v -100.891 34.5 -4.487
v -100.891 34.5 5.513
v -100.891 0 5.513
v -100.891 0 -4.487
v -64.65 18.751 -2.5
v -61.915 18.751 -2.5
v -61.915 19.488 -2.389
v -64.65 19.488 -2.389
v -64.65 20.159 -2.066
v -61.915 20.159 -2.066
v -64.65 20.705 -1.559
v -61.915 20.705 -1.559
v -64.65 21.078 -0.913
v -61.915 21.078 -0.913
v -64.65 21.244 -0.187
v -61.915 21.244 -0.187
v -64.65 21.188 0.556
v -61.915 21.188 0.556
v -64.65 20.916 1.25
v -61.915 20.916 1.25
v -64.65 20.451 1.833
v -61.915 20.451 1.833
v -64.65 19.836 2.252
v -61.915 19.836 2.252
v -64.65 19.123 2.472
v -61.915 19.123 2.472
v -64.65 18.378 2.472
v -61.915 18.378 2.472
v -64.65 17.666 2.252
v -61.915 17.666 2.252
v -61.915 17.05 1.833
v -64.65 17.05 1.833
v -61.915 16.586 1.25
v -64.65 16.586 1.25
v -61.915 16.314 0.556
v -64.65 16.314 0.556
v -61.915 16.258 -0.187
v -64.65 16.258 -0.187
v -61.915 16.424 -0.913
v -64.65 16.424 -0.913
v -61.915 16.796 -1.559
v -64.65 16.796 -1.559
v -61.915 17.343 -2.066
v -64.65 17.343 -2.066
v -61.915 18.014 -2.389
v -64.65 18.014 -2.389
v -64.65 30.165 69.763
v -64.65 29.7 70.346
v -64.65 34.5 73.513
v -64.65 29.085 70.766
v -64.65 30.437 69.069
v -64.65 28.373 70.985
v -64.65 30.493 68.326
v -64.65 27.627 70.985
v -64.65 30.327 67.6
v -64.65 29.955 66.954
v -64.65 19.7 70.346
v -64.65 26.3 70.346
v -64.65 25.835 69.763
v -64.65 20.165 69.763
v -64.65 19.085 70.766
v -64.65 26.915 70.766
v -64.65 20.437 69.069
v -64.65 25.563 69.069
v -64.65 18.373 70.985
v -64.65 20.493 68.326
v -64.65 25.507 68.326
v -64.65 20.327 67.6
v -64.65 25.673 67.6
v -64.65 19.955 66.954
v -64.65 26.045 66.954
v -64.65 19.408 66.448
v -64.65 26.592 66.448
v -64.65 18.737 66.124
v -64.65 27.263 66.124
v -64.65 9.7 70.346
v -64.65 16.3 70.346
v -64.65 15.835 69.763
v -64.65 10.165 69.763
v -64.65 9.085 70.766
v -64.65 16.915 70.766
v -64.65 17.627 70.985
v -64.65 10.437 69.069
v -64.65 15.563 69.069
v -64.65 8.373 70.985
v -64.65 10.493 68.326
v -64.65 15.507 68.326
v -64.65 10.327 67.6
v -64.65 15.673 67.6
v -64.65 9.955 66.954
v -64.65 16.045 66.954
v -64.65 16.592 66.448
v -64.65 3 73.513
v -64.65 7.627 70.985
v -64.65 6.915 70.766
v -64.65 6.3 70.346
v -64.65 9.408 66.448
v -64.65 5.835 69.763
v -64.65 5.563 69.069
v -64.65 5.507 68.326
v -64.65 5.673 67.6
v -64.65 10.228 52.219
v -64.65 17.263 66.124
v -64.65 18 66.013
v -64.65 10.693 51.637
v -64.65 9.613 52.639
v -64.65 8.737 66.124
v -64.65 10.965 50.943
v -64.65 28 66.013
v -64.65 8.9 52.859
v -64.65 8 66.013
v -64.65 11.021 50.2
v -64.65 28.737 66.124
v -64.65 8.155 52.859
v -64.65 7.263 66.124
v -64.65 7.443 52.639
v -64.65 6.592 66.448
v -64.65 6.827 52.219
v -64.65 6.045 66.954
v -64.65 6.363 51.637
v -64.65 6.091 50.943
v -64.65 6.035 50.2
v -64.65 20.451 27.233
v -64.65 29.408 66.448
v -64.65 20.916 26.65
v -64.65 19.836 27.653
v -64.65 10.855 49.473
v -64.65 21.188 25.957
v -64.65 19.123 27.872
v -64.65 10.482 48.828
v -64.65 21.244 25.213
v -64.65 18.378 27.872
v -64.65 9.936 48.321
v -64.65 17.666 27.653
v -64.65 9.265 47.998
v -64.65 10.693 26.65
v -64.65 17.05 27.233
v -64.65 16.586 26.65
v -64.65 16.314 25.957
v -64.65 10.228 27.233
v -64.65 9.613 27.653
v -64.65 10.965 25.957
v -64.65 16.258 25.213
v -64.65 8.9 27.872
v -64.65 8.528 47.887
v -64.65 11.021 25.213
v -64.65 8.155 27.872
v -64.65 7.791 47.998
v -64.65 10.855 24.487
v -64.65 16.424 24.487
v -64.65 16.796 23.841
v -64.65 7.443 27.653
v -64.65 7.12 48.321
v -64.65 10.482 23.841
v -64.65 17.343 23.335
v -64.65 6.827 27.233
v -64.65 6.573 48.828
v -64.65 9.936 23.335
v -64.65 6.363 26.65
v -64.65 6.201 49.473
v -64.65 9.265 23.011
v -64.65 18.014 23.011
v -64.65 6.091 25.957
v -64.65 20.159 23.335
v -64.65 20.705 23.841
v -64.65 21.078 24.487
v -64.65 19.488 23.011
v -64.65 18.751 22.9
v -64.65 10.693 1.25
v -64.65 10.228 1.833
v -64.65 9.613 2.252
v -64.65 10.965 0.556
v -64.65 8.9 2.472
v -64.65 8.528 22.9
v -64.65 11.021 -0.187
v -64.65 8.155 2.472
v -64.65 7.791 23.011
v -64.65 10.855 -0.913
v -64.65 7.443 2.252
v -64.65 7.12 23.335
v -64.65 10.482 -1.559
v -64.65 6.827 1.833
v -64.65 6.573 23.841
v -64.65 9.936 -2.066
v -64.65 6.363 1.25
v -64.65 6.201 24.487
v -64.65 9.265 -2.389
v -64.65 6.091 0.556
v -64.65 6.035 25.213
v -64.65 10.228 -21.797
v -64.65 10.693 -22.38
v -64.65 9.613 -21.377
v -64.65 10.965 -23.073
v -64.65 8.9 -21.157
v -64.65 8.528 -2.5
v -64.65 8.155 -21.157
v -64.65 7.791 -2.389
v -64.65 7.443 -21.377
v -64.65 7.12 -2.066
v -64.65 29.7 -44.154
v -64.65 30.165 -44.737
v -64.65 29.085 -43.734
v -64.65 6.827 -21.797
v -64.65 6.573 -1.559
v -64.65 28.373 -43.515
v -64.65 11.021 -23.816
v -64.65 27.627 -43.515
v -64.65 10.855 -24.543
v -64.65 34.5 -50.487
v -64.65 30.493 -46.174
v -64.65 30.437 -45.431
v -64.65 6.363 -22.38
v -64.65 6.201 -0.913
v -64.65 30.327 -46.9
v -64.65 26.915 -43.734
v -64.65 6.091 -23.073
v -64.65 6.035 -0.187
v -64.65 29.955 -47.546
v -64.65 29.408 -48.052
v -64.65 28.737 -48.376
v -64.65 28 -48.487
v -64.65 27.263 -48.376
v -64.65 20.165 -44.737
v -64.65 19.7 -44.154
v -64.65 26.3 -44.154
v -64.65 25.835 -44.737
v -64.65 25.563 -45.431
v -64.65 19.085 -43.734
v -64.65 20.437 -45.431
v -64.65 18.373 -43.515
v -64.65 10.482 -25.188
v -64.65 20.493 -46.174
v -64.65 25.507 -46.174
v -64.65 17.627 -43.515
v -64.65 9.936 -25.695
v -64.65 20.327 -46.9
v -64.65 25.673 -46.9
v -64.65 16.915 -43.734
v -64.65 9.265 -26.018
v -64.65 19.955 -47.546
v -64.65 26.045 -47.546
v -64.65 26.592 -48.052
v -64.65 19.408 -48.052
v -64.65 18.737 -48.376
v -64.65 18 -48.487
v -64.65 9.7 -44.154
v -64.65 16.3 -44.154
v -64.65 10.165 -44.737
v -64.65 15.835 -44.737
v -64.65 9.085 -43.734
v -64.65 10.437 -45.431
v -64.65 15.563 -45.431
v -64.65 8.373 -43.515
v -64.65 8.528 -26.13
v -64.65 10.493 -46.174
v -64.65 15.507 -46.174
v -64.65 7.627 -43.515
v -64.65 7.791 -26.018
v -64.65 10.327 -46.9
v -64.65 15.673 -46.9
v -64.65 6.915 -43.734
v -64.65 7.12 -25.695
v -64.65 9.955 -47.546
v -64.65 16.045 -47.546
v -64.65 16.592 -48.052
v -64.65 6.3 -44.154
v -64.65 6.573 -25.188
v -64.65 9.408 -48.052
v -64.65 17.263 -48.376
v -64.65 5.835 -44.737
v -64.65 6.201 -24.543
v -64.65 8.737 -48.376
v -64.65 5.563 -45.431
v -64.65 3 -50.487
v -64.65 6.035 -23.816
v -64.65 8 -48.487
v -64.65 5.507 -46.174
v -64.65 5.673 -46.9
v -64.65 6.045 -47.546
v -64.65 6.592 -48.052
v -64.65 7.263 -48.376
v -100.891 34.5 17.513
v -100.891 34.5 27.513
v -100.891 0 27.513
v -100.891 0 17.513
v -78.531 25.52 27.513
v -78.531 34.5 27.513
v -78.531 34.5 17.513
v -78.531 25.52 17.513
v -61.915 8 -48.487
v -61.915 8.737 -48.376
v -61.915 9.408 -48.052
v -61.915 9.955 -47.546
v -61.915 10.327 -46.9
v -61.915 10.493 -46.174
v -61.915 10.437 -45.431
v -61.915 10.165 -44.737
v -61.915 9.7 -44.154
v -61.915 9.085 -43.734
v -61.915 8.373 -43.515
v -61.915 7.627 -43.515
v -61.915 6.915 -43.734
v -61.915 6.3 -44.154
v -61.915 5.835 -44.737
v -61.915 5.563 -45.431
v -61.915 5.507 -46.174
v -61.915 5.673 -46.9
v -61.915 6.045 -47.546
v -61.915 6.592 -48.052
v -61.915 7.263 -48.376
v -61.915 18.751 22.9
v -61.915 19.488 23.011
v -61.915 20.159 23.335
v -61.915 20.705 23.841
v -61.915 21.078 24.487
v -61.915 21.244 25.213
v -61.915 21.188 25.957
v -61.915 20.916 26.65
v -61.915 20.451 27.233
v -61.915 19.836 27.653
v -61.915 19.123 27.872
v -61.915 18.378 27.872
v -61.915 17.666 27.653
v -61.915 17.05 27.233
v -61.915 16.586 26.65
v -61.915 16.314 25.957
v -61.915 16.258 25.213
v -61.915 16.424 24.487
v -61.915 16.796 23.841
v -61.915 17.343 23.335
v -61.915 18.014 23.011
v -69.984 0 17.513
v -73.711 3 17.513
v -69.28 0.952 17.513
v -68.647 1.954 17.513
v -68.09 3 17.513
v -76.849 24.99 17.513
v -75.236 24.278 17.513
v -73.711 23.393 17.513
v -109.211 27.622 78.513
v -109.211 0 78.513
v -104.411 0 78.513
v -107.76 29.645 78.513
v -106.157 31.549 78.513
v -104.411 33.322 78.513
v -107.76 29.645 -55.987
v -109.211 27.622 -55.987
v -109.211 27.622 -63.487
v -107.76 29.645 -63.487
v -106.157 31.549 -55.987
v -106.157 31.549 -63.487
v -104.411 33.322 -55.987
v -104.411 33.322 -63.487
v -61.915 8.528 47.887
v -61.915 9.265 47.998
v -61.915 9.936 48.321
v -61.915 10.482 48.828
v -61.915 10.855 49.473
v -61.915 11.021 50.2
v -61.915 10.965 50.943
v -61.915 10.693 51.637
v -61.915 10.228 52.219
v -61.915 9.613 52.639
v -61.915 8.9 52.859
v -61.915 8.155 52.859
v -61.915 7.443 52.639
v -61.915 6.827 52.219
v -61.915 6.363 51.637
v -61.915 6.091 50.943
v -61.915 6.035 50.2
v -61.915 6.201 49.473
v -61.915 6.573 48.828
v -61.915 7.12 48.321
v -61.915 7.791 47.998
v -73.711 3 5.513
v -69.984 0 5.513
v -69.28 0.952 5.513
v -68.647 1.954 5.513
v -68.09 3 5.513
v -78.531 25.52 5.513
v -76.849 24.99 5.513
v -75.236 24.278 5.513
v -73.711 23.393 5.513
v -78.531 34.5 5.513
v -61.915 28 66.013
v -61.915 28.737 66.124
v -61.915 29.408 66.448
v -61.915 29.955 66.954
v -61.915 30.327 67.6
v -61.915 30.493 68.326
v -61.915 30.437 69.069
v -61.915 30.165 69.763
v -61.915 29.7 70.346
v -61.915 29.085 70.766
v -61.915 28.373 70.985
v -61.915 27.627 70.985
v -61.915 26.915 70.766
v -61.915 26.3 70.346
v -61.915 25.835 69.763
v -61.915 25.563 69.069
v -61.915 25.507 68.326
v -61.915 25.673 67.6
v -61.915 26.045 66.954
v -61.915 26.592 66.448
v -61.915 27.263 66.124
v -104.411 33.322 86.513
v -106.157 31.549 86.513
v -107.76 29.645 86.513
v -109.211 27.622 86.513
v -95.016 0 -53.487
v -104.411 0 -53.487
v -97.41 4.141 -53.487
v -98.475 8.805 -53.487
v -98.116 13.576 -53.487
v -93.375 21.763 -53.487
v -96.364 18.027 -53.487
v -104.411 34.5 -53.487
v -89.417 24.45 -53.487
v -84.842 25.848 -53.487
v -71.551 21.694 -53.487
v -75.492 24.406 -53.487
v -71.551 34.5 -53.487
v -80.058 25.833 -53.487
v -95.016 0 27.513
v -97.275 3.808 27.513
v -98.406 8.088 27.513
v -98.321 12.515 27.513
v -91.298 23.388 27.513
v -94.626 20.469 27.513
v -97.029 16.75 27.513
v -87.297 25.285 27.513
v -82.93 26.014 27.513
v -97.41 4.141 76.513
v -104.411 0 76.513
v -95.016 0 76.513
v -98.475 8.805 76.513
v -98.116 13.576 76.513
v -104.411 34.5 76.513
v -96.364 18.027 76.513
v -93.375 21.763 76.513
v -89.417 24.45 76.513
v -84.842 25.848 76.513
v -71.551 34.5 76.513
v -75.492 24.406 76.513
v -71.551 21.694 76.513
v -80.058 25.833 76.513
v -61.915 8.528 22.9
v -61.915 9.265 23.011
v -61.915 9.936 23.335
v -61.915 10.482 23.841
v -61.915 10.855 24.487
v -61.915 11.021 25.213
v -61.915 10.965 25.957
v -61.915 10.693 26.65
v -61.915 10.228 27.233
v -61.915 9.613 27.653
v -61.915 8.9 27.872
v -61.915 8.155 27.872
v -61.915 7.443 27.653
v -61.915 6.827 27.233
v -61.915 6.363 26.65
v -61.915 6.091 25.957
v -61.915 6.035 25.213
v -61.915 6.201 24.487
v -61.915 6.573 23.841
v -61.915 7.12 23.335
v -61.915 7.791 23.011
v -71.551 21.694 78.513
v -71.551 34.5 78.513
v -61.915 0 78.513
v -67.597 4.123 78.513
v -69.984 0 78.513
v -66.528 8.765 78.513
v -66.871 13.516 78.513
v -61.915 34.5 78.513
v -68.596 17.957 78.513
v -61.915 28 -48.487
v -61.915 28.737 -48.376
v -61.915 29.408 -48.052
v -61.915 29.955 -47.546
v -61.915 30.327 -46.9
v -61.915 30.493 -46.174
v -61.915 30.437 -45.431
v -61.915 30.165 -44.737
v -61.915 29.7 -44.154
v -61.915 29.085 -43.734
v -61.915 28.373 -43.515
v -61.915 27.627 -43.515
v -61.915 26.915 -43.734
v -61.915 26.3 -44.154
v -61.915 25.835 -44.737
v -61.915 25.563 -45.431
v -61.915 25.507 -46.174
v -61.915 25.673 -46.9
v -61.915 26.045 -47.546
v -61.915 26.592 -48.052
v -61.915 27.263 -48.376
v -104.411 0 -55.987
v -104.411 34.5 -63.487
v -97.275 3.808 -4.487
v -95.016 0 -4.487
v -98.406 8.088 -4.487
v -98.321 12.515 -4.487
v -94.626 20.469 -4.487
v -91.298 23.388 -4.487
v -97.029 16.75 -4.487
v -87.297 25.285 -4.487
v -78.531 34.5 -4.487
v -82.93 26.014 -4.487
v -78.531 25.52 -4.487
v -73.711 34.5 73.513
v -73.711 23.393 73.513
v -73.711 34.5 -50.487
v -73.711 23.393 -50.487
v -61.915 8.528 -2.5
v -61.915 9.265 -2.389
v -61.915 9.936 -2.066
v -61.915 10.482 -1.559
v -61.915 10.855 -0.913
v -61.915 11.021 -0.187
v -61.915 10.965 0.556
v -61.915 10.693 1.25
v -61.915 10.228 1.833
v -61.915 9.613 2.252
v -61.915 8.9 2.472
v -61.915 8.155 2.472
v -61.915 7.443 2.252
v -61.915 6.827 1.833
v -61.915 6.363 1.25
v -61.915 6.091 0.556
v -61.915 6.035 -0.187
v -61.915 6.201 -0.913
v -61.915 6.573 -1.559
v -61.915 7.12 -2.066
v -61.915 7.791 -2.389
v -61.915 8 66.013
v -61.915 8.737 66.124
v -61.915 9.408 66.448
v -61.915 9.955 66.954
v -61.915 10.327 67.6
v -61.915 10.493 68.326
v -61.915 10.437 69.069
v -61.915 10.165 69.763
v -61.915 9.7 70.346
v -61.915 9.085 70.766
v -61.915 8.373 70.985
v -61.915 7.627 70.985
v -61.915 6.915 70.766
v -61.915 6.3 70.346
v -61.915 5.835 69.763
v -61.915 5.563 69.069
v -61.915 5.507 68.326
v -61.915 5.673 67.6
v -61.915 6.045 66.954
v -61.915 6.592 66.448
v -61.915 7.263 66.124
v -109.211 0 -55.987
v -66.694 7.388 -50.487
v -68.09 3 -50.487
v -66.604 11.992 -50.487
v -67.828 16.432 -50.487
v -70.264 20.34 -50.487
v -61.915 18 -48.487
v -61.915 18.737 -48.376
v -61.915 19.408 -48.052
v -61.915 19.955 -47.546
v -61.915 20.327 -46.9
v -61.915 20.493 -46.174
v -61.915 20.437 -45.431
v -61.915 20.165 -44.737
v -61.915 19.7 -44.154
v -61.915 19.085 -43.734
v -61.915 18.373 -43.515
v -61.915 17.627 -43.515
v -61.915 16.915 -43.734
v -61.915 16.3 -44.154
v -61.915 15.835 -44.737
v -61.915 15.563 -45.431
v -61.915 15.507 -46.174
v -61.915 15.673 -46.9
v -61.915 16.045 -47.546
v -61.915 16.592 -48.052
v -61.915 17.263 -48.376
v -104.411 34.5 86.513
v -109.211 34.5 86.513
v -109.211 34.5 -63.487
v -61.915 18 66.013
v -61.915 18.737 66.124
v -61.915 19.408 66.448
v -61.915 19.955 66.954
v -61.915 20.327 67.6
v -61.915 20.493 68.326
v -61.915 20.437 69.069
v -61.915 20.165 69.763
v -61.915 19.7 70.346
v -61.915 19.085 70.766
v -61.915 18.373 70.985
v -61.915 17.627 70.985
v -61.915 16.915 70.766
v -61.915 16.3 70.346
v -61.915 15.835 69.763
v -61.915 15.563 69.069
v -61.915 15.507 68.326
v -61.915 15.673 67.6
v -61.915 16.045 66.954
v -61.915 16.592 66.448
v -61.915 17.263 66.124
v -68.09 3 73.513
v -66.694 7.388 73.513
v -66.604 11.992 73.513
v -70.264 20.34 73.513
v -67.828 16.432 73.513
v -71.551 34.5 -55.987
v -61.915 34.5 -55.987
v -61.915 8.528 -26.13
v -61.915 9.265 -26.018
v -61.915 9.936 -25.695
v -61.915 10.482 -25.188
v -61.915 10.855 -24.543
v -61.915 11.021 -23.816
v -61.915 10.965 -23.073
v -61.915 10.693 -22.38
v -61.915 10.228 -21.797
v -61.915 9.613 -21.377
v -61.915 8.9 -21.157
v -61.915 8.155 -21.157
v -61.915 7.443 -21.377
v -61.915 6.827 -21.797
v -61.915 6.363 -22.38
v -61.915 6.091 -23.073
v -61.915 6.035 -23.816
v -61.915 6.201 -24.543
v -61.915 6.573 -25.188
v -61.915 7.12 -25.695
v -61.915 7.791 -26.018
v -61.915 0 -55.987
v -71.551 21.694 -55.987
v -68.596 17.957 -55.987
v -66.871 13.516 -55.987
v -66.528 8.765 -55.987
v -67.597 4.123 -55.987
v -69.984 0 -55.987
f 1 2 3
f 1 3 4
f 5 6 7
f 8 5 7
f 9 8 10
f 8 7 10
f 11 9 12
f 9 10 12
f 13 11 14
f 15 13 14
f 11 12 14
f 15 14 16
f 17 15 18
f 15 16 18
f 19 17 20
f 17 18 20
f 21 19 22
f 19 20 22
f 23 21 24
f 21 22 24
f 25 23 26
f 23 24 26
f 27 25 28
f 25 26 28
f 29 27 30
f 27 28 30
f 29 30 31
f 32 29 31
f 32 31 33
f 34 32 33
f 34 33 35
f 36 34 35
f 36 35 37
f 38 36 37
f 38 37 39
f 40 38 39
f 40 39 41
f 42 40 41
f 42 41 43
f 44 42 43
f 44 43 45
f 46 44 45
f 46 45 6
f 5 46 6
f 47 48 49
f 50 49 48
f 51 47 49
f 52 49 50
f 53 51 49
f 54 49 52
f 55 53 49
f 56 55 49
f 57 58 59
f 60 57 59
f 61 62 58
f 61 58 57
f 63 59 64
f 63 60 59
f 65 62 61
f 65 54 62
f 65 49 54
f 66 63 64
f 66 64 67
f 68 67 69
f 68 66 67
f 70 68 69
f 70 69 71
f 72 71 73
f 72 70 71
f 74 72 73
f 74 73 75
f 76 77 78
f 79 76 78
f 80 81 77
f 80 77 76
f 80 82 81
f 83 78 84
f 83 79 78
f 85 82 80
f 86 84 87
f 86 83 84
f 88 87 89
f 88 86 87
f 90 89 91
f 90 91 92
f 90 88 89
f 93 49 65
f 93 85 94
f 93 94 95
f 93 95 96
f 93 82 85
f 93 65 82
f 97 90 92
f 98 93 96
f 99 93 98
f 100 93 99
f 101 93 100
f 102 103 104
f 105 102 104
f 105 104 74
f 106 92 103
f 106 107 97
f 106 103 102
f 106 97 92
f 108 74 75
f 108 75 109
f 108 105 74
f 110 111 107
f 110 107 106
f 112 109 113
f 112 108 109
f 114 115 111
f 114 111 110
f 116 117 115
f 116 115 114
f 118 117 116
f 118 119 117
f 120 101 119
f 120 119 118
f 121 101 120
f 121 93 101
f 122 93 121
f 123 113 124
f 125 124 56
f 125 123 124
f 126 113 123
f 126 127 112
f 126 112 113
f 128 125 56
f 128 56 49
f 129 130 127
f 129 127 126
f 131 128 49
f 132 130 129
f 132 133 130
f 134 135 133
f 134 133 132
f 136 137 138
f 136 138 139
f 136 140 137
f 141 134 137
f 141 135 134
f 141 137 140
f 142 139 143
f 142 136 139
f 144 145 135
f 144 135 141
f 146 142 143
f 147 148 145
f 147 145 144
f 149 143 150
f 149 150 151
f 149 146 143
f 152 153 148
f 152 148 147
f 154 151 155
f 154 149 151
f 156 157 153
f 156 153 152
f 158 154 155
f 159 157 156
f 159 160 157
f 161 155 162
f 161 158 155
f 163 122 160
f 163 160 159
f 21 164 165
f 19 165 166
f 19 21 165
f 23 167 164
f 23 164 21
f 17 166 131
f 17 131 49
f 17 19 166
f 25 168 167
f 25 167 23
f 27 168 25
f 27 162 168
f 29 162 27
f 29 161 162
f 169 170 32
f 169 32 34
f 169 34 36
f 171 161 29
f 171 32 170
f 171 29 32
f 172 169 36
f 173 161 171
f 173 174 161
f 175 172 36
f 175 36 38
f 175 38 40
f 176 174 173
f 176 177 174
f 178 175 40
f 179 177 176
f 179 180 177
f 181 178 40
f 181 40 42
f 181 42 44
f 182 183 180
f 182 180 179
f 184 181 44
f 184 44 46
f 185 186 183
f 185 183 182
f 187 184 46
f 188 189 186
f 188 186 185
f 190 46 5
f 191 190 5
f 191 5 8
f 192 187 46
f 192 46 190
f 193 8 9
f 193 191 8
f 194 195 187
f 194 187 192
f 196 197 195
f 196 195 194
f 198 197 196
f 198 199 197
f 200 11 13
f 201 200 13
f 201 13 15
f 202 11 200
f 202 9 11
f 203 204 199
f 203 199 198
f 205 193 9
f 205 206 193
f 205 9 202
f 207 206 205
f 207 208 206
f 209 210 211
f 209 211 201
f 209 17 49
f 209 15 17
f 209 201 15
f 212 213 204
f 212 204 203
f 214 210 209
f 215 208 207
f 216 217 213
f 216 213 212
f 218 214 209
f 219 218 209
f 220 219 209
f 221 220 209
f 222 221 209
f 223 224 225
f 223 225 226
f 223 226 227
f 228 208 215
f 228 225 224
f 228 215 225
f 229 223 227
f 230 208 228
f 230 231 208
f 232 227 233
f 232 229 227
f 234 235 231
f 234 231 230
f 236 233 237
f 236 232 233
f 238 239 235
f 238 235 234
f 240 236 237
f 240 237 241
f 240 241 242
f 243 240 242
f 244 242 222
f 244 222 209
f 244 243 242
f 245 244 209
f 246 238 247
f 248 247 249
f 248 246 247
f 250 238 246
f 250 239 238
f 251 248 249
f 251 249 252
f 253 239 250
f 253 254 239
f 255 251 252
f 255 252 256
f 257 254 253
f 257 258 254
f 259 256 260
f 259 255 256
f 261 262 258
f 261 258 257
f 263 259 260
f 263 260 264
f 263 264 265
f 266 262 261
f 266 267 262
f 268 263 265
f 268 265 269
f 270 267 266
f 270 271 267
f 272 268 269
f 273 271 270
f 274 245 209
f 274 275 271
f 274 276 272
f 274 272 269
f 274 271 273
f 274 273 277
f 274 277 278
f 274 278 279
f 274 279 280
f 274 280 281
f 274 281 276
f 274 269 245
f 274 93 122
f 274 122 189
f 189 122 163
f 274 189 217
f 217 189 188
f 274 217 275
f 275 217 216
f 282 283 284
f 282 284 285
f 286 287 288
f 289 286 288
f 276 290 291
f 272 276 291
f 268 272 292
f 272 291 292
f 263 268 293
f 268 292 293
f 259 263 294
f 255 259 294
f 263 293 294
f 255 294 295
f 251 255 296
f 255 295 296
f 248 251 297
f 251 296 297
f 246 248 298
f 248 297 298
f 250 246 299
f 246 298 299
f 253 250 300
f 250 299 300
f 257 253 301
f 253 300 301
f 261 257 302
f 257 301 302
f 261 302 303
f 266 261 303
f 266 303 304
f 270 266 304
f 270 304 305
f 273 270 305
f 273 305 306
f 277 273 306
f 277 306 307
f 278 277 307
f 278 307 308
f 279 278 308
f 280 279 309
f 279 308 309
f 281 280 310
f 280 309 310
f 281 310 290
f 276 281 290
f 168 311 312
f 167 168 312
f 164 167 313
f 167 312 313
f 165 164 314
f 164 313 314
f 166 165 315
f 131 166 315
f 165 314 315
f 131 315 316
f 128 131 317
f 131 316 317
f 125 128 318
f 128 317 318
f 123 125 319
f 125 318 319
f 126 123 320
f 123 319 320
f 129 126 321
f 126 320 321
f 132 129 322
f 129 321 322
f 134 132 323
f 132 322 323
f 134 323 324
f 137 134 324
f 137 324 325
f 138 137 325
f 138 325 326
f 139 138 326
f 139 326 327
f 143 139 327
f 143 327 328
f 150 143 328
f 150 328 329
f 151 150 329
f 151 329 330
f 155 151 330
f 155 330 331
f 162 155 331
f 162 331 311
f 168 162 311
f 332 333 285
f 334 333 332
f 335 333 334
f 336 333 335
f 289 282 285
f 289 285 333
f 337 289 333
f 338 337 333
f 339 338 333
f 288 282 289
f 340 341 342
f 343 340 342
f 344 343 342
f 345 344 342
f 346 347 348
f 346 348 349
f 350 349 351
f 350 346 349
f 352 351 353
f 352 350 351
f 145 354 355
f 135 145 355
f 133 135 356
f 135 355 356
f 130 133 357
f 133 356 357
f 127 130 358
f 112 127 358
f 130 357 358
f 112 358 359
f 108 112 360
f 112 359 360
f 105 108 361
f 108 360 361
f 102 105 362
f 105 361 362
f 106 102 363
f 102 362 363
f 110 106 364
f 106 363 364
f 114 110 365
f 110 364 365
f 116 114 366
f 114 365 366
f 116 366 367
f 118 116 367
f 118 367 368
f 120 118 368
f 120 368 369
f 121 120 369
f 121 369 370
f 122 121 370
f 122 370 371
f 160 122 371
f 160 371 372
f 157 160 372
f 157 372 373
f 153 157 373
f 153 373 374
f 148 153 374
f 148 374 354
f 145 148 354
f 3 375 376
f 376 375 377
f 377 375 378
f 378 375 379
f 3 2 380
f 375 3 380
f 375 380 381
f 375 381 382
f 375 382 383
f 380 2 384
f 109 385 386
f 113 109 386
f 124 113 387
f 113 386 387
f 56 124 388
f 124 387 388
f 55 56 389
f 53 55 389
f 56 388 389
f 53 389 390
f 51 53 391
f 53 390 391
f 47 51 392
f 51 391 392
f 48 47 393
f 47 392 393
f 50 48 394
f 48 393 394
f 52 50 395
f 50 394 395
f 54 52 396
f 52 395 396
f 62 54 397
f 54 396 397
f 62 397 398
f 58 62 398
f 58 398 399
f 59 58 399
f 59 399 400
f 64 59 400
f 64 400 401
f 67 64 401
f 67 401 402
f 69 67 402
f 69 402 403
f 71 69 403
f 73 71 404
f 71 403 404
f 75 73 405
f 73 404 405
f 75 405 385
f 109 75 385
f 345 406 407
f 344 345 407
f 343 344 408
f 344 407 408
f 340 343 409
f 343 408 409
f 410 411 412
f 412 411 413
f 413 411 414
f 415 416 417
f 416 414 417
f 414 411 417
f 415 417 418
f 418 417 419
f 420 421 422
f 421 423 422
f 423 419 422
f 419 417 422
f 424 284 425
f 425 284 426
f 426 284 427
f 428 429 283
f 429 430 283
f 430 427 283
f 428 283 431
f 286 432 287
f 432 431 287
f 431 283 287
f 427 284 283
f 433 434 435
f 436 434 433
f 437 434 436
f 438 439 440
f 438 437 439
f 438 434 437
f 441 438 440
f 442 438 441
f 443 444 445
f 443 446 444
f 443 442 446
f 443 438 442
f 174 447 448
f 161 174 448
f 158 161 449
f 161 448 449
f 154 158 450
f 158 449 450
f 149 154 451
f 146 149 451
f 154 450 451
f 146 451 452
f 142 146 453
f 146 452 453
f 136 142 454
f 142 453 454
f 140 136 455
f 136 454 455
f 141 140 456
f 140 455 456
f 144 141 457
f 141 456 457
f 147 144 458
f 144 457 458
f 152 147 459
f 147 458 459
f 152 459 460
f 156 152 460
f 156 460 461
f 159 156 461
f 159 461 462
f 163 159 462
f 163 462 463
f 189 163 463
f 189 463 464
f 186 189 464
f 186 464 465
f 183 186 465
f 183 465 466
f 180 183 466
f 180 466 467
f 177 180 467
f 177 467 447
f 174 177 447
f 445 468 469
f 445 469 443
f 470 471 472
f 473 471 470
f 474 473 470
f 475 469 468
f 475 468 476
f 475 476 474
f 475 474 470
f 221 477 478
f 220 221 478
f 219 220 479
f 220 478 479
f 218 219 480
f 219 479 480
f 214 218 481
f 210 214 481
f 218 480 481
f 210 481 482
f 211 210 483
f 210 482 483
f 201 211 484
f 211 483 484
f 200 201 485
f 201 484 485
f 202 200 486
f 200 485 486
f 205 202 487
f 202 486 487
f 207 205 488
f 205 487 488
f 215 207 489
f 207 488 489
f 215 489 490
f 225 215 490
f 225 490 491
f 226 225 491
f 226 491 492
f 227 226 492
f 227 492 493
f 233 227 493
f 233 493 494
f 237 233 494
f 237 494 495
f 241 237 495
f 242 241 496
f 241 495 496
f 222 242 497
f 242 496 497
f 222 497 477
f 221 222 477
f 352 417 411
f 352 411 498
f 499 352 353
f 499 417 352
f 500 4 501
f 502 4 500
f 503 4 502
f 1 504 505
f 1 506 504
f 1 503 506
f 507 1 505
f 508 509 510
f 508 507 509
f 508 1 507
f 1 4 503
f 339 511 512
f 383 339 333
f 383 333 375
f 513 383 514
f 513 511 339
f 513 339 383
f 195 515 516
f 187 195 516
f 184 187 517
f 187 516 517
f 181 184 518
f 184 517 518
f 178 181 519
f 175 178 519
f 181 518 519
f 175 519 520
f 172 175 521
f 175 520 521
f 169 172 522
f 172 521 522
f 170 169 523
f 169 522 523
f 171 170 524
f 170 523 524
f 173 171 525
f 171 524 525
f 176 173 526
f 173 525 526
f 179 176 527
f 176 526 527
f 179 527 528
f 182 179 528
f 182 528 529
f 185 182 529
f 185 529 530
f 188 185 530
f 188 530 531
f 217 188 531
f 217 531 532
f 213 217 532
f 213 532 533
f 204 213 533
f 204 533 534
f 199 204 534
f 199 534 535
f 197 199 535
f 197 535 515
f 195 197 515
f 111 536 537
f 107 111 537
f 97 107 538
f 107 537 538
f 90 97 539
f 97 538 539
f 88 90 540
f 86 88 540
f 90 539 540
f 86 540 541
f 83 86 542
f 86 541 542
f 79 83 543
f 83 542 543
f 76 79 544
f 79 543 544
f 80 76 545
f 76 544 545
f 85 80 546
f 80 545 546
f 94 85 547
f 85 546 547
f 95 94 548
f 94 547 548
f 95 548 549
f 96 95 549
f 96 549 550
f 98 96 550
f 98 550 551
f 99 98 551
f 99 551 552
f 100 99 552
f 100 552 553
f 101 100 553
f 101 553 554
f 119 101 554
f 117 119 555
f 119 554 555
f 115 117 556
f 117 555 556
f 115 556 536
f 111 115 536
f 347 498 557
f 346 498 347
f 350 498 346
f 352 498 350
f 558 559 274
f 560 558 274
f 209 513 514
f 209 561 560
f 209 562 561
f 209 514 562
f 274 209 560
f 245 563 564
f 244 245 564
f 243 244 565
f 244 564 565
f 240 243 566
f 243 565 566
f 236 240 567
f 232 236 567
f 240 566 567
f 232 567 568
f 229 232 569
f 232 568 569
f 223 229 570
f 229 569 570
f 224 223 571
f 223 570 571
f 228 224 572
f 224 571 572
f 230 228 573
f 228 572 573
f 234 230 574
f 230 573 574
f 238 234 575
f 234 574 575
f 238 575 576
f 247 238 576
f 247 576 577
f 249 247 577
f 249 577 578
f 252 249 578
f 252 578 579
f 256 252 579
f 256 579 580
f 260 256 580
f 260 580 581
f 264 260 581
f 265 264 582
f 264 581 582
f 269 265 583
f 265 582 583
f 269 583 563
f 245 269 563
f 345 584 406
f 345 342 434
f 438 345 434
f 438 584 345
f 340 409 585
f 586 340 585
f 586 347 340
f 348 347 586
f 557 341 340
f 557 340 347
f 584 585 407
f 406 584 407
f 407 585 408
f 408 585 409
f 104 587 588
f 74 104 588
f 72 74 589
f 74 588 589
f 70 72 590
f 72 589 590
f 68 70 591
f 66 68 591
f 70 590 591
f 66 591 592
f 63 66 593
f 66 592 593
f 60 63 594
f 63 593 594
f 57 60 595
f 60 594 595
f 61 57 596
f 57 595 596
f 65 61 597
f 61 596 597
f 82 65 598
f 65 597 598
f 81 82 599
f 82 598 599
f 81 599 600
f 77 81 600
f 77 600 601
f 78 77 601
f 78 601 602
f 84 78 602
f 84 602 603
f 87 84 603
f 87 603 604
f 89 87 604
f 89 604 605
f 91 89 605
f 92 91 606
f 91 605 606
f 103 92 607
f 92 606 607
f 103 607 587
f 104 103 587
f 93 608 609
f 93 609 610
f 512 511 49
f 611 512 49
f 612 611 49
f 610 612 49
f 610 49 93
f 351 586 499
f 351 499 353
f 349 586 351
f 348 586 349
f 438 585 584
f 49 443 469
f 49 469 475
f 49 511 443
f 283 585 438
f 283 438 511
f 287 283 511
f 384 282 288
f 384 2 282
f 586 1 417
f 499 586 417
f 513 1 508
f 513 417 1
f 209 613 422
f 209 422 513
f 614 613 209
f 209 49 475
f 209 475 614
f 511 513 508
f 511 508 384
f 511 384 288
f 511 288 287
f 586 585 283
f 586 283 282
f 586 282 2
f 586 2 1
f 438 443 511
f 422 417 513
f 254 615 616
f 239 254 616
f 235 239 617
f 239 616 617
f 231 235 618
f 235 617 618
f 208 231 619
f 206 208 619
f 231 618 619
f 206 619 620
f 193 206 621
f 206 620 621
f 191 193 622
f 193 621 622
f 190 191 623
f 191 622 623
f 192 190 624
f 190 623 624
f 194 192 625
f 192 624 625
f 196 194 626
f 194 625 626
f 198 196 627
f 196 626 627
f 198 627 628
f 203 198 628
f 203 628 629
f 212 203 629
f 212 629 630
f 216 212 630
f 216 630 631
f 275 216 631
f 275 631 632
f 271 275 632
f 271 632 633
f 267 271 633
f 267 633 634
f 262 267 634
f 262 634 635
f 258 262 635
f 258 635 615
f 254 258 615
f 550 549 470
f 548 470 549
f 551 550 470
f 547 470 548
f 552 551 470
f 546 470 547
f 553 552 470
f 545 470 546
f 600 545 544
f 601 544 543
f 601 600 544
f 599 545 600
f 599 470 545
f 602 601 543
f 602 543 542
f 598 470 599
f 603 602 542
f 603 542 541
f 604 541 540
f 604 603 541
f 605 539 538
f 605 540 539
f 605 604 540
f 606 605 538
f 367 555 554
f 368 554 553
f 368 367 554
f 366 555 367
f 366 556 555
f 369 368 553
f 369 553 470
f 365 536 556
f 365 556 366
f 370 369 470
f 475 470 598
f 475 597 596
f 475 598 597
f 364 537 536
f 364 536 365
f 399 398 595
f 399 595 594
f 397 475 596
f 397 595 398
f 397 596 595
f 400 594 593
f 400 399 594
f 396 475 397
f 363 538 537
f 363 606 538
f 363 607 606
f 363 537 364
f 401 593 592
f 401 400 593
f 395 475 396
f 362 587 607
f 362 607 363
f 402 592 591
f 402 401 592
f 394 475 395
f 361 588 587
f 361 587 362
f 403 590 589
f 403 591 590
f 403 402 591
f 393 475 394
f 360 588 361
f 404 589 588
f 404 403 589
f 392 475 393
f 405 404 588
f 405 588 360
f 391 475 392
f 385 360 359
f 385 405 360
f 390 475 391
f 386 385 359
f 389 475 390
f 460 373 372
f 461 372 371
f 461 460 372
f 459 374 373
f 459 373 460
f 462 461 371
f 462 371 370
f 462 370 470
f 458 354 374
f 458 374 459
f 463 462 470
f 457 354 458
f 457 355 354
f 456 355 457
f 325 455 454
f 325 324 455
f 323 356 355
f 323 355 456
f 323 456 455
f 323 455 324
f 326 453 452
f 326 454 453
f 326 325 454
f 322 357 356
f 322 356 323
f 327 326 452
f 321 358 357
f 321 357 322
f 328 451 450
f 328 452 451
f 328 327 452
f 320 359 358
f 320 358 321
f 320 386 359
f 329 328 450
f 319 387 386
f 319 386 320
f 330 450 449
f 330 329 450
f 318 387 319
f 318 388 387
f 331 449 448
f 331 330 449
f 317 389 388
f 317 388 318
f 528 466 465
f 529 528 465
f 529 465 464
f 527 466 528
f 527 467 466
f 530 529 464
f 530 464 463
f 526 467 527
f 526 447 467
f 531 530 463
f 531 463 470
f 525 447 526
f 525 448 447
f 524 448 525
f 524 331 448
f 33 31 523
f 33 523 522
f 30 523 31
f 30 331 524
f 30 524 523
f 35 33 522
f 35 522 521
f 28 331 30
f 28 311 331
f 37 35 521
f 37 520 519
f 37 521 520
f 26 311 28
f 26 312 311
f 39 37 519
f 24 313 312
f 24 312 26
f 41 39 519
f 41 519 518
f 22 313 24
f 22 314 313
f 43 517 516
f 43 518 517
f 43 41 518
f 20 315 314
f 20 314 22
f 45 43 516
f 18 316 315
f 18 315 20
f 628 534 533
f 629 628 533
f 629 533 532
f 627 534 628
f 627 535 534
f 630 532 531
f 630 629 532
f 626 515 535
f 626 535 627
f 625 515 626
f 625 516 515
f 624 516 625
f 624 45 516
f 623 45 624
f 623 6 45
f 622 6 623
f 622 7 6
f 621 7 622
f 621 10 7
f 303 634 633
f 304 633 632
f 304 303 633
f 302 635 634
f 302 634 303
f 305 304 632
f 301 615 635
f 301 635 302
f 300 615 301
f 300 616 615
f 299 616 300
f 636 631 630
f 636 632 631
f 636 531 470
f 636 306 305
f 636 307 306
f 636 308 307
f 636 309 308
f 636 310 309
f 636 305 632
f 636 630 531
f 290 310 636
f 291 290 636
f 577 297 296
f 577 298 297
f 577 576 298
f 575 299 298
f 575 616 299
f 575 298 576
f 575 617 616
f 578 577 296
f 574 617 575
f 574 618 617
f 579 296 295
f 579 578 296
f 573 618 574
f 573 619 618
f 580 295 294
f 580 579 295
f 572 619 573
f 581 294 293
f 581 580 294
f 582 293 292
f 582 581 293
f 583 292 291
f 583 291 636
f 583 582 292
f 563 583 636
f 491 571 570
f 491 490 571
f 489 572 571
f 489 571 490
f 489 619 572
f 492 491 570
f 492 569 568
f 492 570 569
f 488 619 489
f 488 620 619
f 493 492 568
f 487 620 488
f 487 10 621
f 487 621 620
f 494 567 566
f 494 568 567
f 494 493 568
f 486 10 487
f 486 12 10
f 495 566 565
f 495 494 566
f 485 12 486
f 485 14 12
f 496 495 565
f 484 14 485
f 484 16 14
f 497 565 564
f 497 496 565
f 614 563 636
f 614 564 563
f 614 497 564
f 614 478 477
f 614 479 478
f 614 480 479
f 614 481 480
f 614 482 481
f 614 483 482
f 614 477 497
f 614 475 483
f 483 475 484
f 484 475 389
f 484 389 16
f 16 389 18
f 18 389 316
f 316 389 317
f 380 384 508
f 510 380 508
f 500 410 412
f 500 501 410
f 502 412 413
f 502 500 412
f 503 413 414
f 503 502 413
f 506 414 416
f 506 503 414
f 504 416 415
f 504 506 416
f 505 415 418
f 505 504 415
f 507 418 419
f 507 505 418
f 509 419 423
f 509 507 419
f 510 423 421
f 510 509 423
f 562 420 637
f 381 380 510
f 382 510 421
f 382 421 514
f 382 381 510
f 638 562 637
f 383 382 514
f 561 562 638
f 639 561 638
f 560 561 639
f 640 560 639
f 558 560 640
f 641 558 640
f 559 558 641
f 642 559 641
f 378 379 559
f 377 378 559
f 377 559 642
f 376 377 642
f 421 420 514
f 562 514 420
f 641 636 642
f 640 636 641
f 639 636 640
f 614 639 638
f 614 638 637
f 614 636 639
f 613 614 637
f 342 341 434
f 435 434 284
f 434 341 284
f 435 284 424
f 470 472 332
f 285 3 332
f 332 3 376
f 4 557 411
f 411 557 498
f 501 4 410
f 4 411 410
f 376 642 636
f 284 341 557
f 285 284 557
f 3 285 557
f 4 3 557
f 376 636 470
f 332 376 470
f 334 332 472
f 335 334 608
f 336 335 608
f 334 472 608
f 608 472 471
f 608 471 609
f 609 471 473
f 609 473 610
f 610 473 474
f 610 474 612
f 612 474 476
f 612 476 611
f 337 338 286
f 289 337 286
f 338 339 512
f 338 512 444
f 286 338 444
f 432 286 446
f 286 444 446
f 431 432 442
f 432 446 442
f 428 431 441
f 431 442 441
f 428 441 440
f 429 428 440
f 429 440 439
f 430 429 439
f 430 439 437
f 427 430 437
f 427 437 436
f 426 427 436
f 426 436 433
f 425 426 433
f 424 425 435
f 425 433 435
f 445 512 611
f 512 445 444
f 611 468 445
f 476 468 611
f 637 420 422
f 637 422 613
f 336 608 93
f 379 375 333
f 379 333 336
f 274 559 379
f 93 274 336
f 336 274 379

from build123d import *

# Parameters (mm, degrees)
CUBE_W                    = 150
CUBE_H                    = 150
BOSS_EXTRU_1_DEPTH        = 34.5
PAVE_W                    = 96
PAVE_H                    = 144
ENL_V_MAT_EXTRU_1_DEPTH   = 31.5
VIS1_R                    = 2.5
ENL_V_MAT_EXTRU_2_DEPTH   = 5
ENL_V_START               = -5
VIS2_R                    = 2.5
ENL_V_MAT_EXTRU_3_DEPTH   = 5
PAVE_PROCHE_MOTEUR_W      = 12.5
PAVE_PROCHE_MOTEUR_H      = 124
ENL_V_MAT_EXTRU_4_DEPTH   = 31.5
PAVE_ROUE_LIBRE_W         = 32.86
PAVE_ROUE_LIBRE_H         = 15.696676457
PAVE_ROUE_LIBRE_H_2       = 18.419496328
ENL_V_MAT_EXTRU_5_DEPTH   = 36
CABLES_W                  = 22.36
CABLES_H                  = 10
ENL_V_MAT_EXTRU_6_DEPTH   = 36
ROUE_EXT_R                = 32
ENL_V_MAT_EXTRU_7_DEPTH   = 8
ROUE_INTER_R              = 16.02
ENL_V_MAT_EXTRU_8_DEPTH   = 69
ENL_V_START_2             = -7.5
ROUE_EXT2_R               = 32
ENL_V_MAT_EXTRU_9_DEPTH   = 7.5
ENL_V_START_3             = -69
ROUE_INTER2_R             = 16.02
ENL_V_MAT_EXTRU_10_DEPTH  = 69
VIS_MOTEUR_POUR_SUPPORT_R = 2.5
ENL_V_MAT_EXTRU_11_DEPTH  = 10
BOSS_EXTRU_2_DEPTH        = 10
ESQUISSE2_R               = 2.5
ENL_V_MAT_EXTRU_12_DEPTH  = 10
ESQUISSE3_W               = 3.439870431
ESQUISSE3_H               = 124
BOSS_EXTRU_3_DEPTH        = 31
ESQUISSE5_W               = 3.439870431
ESQUISSE5_H               = 124
BOSS_EXTRU_4_DEPTH        = 0.5
ESQUISSE6_R               = 2.5
ENL_V_MAT_EXTRU_13_DEPTH  = 10
ESQUISSE7_R               = 2.5
ENL_V_MAT_EXTRU_14_DEPTH  = 10
ESQUISSE8_R               = 2.5
ENL_V_MAT_EXTRU_15_DEPTH  = 10
ESQUISSE10_W              = 102.704284834
ESQUISSE10_H              = 150
ENL_V_MAT_EXTRU_16_DEPTH  = 40


with BuildPart() as part:
    # Cube → Boss.-Extru.1 (new body)
    with BuildSketch(Plane(origin=(0, 0, 0), x_dir=(1, 0, 0), z_dir=(0, 1, 0))):
        with Locations((-34.210526316, -11.513157895)):
            Rectangle(CUBE_W, CUBE_H)
    extrude(amount=BOSS_EXTRU_1_DEPTH)

    # Pave → Enlèv. mat.-Extru.1 (cut)
    with BuildSketch(Plane(origin=(0, 34.5, 0), x_dir=(1, 0, 0), z_dir=(0, 1, 0))):
        with Locations((-10.210526316, -11.513157895)):
            Rectangle(PAVE_W, PAVE_H)
    extrude(amount=-ENL_V_MAT_EXTRU_1_DEPTH, mode=Mode.SUBTRACT)

    # Vis1 → Enlèv. mat.-Extru.2 (cut)
    with BuildSketch(Plane.XY.offset(86.513157895)):
        with Locations((33.789473684, 10)):
            Circle(VIS1_R)
        with Locations((33.789473684, 20)):
            Circle(VIS1_R)
        with Locations((33.789473684, 30)):
            Circle(VIS1_R)
    extrude(amount=-ENL_V_MAT_EXTRU_2_DEPTH, mode=Mode.SUBTRACT)

    # Vis2 → Enlèv. mat.-Extru.3 (cut)
    with BuildSketch(Plane(origin=(0, 0, -63.486842105), x_dir=(-1, 0, 0), z_dir=(0, 0, -1)).offset(ENL_V_START)):
        with Locations(Location((-33.789473684, 10, 0), (0, 0, 180))):
            Circle(VIS2_R)
        with Locations(Location((-33.789473684, 20, 0), (0, 0, 180))):
            Circle(VIS2_R)
        with Locations(Location((-33.789473684, 30, 0), (0, 0, 180))):
            Circle(VIS2_R)
    extrude(amount=ENL_V_MAT_EXTRU_3_DEPTH, mode=Mode.SUBTRACT)

    # Pave proche moteur → Enlèv. mat.-Extru.4 (cut)
    with BuildSketch(Plane(origin=(0, 34.5, 0), x_dir=(1, 0, 0), z_dir=(0, 1, 0))):
        with Locations((-67.460526316, -11.513157895)):
            Rectangle(PAVE_PROCHE_MOTEUR_W, PAVE_PROCHE_MOTEUR_H)
    extrude(amount=-ENL_V_MAT_EXTRU_4_DEPTH, mode=Mode.SUBTRACT)

    # Pave Roue libre → Enlèv. mat.-Extru.5 (cut)
    with BuildSketch(Plane(origin=(0, 34.5, 0), x_dir=(1, 0, 0), z_dir=(0, 1, 0))):
        with Locations((-87.980526316, 61.335180334)):
            Rectangle(PAVE_ROUE_LIBRE_W, PAVE_ROUE_LIBRE_H)
        with Locations((-87.980526316, -85.722906059)):
            Rectangle(PAVE_ROUE_LIBRE_W, PAVE_ROUE_LIBRE_H_2)
    extrude(amount=-ENL_V_MAT_EXTRU_5_DEPTH, mode=Mode.SUBTRACT)

    # Cables → Enlèv. mat.-Extru.6 (cut)
    with BuildSketch(Plane(origin=(0, 34.5, 0), x_dir=(1, 0, 0), z_dir=(0, 1, 0))):
        with Locations((-89.710526316, -0.513157895)):
            Rectangle(CABLES_W, CABLES_H)
        with Locations((-89.710526316, -22.513157895)):
            Rectangle(CABLES_W, CABLES_H)
    extrude(amount=-ENL_V_MAT_EXTRU_6_DEPTH, mode=Mode.SUBTRACT)

    # Roue ext → Enlèv. mat.-Extru.7 (cut)
    with BuildSketch(Plane.XY.offset(86.513157895)):
        with Locations((-82.5, 10)):
            Circle(ROUE_EXT_R)
    extrude(amount=-ENL_V_MAT_EXTRU_7_DEPTH, mode=Mode.SUBTRACT)

    # Roue inter → Enlèv. mat.-Extru.8 (cut)
    with BuildSketch(Plane.XY.offset(86.513157895)):
        with Locations((-82.5, 10)):
            Circle(ROUE_INTER_R)
    extrude(amount=-ENL_V_MAT_EXTRU_8_DEPTH, mode=Mode.SUBTRACT)

    # Roue ext2 → Enlèv. mat.-Extru.9 (cut)
    with BuildSketch(Plane(origin=(0, 0, -63.486842105), x_dir=(-1, 0, 0), z_dir=(0, 0, -1)).offset(ENL_V_START_2)):
        with Locations((82.5, 10)):
            Circle(ROUE_EXT2_R)
    extrude(amount=ENL_V_MAT_EXTRU_9_DEPTH, mode=Mode.SUBTRACT)

    # Roue inter2 → Enlèv. mat.-Extru.10 (cut)
    with BuildSketch(Plane(origin=(0, 0, -63.486842105), x_dir=(-1, 0, 0), z_dir=(0, 0, -1)).offset(ENL_V_START_3)):
        with Locations((82.5, 10)):
            Circle(ROUE_INTER2_R)
    extrude(amount=ENL_V_MAT_EXTRU_10_DEPTH, mode=Mode.SUBTRACT)

    # Vis Moteur pour support → Enlèv. mat.-Extru.11 (cut)
    with BuildSketch(Plane(origin=(-58.210526316, 0, 0), x_dir=(0, 0, -1), z_dir=(1, 0, 0))):
        with Locations((-68.513157895, 8)):
            Circle(VIS_MOTEUR_POUR_SUPPORT_R)
        with Locations((-68.513157895, 18)):
            Circle(VIS_MOTEUR_POUR_SUPPORT_R)
        with Locations((-68.513157895, 28)):
            Circle(VIS_MOTEUR_POUR_SUPPORT_R)
        with Locations((45.986842105, 8)):
            Circle(VIS_MOTEUR_POUR_SUPPORT_R)
        with Locations((45.986842105, 18)):
            Circle(VIS_MOTEUR_POUR_SUPPORT_R)
        with Locations((45.986842105, 28)):
            Circle(VIS_MOTEUR_POUR_SUPPORT_R)
    extrude(amount=-ENL_V_MAT_EXTRU_11_DEPTH, mode=Mode.SUBTRACT)

    # Esquisse1 → Boss.-Extru.2 (add)
    with BuildSketch(Plane(origin=(0, 3, 0), x_dir=(1, 0, 0), z_dir=(0, 1, 0))):
        Polygon((-58.210526316, -15.513157895), (-14.210526316, -15.513157895), (-14.210526316, -83.513157895), (-6.210526316, -83.513157895), (-6.210526316, -15.513157895), (37.789473684, -15.513157895), (37.789473684, -7.513157895), (-6.210526316, -7.513157895), (-6.210526316, 60.486842105), (-14.210526316, 60.486842105), (-14.210526316, -7.513157895), (-58.210526316, -7.513157895), align=None)
    extrude(amount=BOSS_EXTRU_2_DEPTH)

    # Esquisse2 → Enlèv. mat.-Extru.12 (cut)
    with BuildSketch(Plane.XY.offset(15.513157895)):
        with Locations((-43.942882256, 8)):
            Circle(ESQUISSE2_R)
        with Locations((-26.88958752, 8)):
            Circle(ESQUISSE2_R)
        with Locations((9.588466595, 8)):
            Circle(ESQUISSE2_R)
        with Locations((23.56238511, 8)):
            Circle(ESQUISSE2_R)
    extrude(amount=-ENL_V_MAT_EXTRU_12_DEPTH, mode=Mode.SUBTRACT)

    # Esquisse3 → Boss.-Extru.3 (add)
    with BuildSketch(Plane(origin=(0, 3, 0), x_dir=(1, 0, 0), z_dir=(0, 1, 0))):
        with Locations((-62.930461532, -11.513157895)):
            Rectangle(ESQUISSE3_W, ESQUISSE3_H)
    extrude(amount=BOSS_EXTRU_3_DEPTH)

    # Esquisse5 → Boss.-Extru.4 (add)
    with BuildSketch(Plane(origin=(0, 34, 0), x_dir=(1, 0, 0), z_dir=(0, 1, 0))):
        with Locations((-62.930461532, -11.513157895)):
            Rectangle(ESQUISSE5_W, ESQUISSE5_H)
    extrude(amount=BOSS_EXTRU_4_DEPTH)

    # Esquisse6 → Enlèv. mat.-Extru.13 (cut)
    with BuildSketch(Plane(origin=(-58.210526316, 0, 0), x_dir=(0, 0, -1), z_dir=(1, 0, 0))):
        with Locations((-68.513157895, 28)):
            Circle(ESQUISSE6_R)
        with Locations((-68.513157895, 18)):
            Circle(ESQUISSE6_R)
        with Locations((-68.513157895, 8)):
            Circle(ESQUISSE6_R)
        with Locations((45.986842105, 28)):
            Circle(ESQUISSE6_R)
        with Locations((45.986842105, 18)):
            Circle(ESQUISSE6_R)
        with Locations((45.986842105, 8)):
            Circle(ESQUISSE6_R)
    extrude(amount=-ENL_V_MAT_EXTRU_13_DEPTH, mode=Mode.SUBTRACT)

    # Esquisse7 → Enlèv. mat.-Extru.14 (cut)
    with BuildSketch(Plane(origin=(-58.210526316, 0, 0), x_dir=(0, 0, -1), z_dir=(1, 0, 0))):
        with Locations((0, 8.527871685)):
            Circle(ESQUISSE7_R)
        with Locations((0, 18.750861141)):
            Circle(ESQUISSE7_R)
        with Locations((-25.400224022, 8.527871685)):
            Circle(ESQUISSE7_R)
        with Locations((-25.400224022, 18.750861141)):
            Circle(ESQUISSE7_R)
        with Locations((-50.386538843, 8.527871685)):
            Circle(ESQUISSE7_R)
        with Locations((23.629525814, 8.527871685)):
            Circle(ESQUISSE7_R)
    extrude(amount=-ENL_V_MAT_EXTRU_14_DEPTH, mode=Mode.SUBTRACT)

    # Esquisse8 → Enlèv. mat.-Extru.15 (cut)
    with BuildSketch(Plane(origin=(0, 3, 0), x_dir=(1, 0, 0), z_dir=(0, 1, 0))):
        with Locations(Location((19.789473684, -43.513157895, 0), (0, 0, 270))):
            Circle(ESQUISSE8_R)
        with Locations(Location((19.789473684, 20.486842105, 0), (0, 0, 270))):
            Circle(ESQUISSE8_R)
    extrude(amount=-ENL_V_MAT_EXTRU_15_DEPTH, mode=Mode.SUBTRACT)

    # Esquisse10 → Enlèv. mat.-Extru.16 (cut)
    with BuildSketch(Plane(origin=(0, 34.5, 0), x_dir=(1, 0, 0), z_dir=(0, 1, 0))):
        with Locations((-10.562668733, -11.513157895)):
            Rectangle(ESQUISSE10_W, ESQUISSE10_H)
    extrude(amount=-ENL_V_MAT_EXTRU_16_DEPTH, mode=Mode.SUBTRACT)


solid = part.part
